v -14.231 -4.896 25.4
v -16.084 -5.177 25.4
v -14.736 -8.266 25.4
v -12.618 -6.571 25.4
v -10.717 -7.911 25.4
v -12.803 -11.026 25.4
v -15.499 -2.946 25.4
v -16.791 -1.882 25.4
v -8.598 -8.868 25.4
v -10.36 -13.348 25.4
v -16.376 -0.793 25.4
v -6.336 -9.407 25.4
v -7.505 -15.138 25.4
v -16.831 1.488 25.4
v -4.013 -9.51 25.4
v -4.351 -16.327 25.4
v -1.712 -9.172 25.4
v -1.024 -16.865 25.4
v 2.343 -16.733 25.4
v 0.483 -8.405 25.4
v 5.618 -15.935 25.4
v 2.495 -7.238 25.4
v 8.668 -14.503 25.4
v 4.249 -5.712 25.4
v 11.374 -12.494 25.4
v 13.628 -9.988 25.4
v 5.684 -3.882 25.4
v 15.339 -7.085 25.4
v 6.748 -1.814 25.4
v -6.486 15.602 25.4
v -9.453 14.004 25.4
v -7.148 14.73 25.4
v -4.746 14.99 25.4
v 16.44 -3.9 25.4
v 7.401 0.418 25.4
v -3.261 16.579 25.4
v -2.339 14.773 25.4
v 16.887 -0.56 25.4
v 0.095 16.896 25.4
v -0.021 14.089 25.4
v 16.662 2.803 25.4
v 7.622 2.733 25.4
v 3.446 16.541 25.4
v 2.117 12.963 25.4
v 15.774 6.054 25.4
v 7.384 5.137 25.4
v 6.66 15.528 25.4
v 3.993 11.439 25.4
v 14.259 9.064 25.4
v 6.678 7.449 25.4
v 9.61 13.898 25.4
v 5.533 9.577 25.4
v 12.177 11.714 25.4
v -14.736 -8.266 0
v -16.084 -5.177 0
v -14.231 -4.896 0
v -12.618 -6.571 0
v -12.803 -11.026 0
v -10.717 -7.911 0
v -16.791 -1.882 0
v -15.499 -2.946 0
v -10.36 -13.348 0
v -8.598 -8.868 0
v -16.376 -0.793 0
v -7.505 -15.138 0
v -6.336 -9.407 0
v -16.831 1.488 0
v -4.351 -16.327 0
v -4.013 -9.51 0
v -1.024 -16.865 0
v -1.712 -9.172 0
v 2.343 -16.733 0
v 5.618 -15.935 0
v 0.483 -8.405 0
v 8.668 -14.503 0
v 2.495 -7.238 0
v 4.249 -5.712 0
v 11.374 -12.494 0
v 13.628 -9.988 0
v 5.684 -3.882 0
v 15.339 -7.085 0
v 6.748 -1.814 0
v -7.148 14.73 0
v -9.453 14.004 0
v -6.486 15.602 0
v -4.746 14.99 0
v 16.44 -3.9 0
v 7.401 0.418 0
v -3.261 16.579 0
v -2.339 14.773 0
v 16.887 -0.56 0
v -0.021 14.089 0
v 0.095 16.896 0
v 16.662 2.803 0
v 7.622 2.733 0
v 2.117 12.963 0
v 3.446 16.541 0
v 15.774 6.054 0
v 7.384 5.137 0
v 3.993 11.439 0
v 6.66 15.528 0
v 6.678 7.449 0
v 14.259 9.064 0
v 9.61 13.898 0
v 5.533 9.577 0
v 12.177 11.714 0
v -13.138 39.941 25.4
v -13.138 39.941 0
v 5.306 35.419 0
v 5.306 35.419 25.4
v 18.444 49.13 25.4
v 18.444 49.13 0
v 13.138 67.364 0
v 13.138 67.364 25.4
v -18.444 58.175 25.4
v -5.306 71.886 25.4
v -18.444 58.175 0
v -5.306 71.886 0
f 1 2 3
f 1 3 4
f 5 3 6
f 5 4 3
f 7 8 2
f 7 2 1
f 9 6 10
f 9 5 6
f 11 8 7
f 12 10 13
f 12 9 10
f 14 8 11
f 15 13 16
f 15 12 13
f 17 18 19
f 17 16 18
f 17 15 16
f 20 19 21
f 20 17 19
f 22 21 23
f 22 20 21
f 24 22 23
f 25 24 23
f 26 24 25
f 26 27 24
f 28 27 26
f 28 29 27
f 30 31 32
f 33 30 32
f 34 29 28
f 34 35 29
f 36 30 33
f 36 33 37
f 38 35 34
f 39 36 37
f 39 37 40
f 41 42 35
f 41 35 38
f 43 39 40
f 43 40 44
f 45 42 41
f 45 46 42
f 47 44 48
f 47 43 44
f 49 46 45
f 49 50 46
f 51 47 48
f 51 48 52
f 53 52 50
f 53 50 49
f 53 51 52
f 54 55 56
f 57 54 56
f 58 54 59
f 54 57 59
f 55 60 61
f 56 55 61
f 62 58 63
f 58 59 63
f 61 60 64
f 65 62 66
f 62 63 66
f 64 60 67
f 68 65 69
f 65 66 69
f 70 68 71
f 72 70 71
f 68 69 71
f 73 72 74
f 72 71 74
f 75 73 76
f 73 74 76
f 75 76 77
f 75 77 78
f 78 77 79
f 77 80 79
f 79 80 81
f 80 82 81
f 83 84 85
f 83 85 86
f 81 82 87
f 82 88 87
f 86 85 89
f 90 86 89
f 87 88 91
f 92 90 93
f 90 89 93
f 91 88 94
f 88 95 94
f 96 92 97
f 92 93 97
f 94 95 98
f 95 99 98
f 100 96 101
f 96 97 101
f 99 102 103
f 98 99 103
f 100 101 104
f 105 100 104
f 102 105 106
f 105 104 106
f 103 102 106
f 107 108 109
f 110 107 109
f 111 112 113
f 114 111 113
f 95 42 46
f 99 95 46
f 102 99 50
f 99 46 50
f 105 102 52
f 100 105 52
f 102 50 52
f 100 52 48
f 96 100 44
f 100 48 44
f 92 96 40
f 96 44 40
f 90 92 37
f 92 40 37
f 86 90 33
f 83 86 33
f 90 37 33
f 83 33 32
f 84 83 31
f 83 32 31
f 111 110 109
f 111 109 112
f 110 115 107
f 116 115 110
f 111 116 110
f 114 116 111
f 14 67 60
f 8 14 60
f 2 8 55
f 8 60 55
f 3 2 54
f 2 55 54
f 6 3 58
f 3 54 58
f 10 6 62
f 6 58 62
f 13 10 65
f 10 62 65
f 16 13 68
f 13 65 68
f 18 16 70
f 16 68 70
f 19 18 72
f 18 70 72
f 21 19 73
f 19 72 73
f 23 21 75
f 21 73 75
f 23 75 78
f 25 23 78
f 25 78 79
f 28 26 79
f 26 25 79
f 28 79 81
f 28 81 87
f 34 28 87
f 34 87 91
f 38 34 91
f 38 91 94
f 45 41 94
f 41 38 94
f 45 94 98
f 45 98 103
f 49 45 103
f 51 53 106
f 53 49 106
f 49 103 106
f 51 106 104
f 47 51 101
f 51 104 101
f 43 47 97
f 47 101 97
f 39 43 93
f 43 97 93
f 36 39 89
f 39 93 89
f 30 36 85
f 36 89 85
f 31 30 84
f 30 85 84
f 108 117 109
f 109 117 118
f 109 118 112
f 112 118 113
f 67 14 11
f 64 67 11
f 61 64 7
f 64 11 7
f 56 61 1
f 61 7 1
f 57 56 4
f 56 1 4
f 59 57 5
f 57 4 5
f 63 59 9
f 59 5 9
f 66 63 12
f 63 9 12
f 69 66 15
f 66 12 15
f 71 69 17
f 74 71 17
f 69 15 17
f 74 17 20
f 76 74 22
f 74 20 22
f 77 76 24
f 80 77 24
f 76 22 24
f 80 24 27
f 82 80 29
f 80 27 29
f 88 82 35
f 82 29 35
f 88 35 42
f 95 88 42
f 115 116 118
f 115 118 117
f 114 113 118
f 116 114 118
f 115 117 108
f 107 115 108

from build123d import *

# Parameters (mm, degrees)
F0_R     = 16.8963338529
F1_DEPTH = 25.4
F3_DEPTH = 25.4


with BuildPart() as f1:
    # F0 (on Top) → F1 (new body)
    with BuildSketch(Plane.XY):
        Circle(F0_R)
    extrude(amount=F1_DEPTH)

    # F2 (on face) → F3 (cut)
    with BuildSketch(Plane.XY.offset(25.4)):
        with BuildLine():
            ThreePointArc((-16.8306893282, 1.4879497325), (-4.0129229756, -9.509621723), (7.6219865538, 2.7325428091))
            ThreePointArc((7.6219865538, 2.7325428091), (2.1170359569, 12.9626462096), (-9.4533791603, 14.0042750659))
            ThreePointArc((-9.4533791603, 14.0042750659), (-14.5560181382, 8.5795357467), (-16.8306893282, 1.4879497325))
        make_face()
    extrude(amount=-F3_DEPTH, mode=Mode.SUBTRACT)


with BuildPart() as f1b:
    # F0 (on Top) → F1, piece 2 (new body)
    with BuildSketch(Plane.XY):
        Polygon((18.4437576021, 49.1303880544), (13.1381061589, 67.3641855983), (-5.3056514432, 71.8862554368), (-18.4437576021, 58.1745277314), (-13.1381061589, 39.9407301875), (5.3056514432, 35.418660349), align=None)
    extrude(amount=F1_DEPTH)


solid = Compound([f1.part, f1b.part])
